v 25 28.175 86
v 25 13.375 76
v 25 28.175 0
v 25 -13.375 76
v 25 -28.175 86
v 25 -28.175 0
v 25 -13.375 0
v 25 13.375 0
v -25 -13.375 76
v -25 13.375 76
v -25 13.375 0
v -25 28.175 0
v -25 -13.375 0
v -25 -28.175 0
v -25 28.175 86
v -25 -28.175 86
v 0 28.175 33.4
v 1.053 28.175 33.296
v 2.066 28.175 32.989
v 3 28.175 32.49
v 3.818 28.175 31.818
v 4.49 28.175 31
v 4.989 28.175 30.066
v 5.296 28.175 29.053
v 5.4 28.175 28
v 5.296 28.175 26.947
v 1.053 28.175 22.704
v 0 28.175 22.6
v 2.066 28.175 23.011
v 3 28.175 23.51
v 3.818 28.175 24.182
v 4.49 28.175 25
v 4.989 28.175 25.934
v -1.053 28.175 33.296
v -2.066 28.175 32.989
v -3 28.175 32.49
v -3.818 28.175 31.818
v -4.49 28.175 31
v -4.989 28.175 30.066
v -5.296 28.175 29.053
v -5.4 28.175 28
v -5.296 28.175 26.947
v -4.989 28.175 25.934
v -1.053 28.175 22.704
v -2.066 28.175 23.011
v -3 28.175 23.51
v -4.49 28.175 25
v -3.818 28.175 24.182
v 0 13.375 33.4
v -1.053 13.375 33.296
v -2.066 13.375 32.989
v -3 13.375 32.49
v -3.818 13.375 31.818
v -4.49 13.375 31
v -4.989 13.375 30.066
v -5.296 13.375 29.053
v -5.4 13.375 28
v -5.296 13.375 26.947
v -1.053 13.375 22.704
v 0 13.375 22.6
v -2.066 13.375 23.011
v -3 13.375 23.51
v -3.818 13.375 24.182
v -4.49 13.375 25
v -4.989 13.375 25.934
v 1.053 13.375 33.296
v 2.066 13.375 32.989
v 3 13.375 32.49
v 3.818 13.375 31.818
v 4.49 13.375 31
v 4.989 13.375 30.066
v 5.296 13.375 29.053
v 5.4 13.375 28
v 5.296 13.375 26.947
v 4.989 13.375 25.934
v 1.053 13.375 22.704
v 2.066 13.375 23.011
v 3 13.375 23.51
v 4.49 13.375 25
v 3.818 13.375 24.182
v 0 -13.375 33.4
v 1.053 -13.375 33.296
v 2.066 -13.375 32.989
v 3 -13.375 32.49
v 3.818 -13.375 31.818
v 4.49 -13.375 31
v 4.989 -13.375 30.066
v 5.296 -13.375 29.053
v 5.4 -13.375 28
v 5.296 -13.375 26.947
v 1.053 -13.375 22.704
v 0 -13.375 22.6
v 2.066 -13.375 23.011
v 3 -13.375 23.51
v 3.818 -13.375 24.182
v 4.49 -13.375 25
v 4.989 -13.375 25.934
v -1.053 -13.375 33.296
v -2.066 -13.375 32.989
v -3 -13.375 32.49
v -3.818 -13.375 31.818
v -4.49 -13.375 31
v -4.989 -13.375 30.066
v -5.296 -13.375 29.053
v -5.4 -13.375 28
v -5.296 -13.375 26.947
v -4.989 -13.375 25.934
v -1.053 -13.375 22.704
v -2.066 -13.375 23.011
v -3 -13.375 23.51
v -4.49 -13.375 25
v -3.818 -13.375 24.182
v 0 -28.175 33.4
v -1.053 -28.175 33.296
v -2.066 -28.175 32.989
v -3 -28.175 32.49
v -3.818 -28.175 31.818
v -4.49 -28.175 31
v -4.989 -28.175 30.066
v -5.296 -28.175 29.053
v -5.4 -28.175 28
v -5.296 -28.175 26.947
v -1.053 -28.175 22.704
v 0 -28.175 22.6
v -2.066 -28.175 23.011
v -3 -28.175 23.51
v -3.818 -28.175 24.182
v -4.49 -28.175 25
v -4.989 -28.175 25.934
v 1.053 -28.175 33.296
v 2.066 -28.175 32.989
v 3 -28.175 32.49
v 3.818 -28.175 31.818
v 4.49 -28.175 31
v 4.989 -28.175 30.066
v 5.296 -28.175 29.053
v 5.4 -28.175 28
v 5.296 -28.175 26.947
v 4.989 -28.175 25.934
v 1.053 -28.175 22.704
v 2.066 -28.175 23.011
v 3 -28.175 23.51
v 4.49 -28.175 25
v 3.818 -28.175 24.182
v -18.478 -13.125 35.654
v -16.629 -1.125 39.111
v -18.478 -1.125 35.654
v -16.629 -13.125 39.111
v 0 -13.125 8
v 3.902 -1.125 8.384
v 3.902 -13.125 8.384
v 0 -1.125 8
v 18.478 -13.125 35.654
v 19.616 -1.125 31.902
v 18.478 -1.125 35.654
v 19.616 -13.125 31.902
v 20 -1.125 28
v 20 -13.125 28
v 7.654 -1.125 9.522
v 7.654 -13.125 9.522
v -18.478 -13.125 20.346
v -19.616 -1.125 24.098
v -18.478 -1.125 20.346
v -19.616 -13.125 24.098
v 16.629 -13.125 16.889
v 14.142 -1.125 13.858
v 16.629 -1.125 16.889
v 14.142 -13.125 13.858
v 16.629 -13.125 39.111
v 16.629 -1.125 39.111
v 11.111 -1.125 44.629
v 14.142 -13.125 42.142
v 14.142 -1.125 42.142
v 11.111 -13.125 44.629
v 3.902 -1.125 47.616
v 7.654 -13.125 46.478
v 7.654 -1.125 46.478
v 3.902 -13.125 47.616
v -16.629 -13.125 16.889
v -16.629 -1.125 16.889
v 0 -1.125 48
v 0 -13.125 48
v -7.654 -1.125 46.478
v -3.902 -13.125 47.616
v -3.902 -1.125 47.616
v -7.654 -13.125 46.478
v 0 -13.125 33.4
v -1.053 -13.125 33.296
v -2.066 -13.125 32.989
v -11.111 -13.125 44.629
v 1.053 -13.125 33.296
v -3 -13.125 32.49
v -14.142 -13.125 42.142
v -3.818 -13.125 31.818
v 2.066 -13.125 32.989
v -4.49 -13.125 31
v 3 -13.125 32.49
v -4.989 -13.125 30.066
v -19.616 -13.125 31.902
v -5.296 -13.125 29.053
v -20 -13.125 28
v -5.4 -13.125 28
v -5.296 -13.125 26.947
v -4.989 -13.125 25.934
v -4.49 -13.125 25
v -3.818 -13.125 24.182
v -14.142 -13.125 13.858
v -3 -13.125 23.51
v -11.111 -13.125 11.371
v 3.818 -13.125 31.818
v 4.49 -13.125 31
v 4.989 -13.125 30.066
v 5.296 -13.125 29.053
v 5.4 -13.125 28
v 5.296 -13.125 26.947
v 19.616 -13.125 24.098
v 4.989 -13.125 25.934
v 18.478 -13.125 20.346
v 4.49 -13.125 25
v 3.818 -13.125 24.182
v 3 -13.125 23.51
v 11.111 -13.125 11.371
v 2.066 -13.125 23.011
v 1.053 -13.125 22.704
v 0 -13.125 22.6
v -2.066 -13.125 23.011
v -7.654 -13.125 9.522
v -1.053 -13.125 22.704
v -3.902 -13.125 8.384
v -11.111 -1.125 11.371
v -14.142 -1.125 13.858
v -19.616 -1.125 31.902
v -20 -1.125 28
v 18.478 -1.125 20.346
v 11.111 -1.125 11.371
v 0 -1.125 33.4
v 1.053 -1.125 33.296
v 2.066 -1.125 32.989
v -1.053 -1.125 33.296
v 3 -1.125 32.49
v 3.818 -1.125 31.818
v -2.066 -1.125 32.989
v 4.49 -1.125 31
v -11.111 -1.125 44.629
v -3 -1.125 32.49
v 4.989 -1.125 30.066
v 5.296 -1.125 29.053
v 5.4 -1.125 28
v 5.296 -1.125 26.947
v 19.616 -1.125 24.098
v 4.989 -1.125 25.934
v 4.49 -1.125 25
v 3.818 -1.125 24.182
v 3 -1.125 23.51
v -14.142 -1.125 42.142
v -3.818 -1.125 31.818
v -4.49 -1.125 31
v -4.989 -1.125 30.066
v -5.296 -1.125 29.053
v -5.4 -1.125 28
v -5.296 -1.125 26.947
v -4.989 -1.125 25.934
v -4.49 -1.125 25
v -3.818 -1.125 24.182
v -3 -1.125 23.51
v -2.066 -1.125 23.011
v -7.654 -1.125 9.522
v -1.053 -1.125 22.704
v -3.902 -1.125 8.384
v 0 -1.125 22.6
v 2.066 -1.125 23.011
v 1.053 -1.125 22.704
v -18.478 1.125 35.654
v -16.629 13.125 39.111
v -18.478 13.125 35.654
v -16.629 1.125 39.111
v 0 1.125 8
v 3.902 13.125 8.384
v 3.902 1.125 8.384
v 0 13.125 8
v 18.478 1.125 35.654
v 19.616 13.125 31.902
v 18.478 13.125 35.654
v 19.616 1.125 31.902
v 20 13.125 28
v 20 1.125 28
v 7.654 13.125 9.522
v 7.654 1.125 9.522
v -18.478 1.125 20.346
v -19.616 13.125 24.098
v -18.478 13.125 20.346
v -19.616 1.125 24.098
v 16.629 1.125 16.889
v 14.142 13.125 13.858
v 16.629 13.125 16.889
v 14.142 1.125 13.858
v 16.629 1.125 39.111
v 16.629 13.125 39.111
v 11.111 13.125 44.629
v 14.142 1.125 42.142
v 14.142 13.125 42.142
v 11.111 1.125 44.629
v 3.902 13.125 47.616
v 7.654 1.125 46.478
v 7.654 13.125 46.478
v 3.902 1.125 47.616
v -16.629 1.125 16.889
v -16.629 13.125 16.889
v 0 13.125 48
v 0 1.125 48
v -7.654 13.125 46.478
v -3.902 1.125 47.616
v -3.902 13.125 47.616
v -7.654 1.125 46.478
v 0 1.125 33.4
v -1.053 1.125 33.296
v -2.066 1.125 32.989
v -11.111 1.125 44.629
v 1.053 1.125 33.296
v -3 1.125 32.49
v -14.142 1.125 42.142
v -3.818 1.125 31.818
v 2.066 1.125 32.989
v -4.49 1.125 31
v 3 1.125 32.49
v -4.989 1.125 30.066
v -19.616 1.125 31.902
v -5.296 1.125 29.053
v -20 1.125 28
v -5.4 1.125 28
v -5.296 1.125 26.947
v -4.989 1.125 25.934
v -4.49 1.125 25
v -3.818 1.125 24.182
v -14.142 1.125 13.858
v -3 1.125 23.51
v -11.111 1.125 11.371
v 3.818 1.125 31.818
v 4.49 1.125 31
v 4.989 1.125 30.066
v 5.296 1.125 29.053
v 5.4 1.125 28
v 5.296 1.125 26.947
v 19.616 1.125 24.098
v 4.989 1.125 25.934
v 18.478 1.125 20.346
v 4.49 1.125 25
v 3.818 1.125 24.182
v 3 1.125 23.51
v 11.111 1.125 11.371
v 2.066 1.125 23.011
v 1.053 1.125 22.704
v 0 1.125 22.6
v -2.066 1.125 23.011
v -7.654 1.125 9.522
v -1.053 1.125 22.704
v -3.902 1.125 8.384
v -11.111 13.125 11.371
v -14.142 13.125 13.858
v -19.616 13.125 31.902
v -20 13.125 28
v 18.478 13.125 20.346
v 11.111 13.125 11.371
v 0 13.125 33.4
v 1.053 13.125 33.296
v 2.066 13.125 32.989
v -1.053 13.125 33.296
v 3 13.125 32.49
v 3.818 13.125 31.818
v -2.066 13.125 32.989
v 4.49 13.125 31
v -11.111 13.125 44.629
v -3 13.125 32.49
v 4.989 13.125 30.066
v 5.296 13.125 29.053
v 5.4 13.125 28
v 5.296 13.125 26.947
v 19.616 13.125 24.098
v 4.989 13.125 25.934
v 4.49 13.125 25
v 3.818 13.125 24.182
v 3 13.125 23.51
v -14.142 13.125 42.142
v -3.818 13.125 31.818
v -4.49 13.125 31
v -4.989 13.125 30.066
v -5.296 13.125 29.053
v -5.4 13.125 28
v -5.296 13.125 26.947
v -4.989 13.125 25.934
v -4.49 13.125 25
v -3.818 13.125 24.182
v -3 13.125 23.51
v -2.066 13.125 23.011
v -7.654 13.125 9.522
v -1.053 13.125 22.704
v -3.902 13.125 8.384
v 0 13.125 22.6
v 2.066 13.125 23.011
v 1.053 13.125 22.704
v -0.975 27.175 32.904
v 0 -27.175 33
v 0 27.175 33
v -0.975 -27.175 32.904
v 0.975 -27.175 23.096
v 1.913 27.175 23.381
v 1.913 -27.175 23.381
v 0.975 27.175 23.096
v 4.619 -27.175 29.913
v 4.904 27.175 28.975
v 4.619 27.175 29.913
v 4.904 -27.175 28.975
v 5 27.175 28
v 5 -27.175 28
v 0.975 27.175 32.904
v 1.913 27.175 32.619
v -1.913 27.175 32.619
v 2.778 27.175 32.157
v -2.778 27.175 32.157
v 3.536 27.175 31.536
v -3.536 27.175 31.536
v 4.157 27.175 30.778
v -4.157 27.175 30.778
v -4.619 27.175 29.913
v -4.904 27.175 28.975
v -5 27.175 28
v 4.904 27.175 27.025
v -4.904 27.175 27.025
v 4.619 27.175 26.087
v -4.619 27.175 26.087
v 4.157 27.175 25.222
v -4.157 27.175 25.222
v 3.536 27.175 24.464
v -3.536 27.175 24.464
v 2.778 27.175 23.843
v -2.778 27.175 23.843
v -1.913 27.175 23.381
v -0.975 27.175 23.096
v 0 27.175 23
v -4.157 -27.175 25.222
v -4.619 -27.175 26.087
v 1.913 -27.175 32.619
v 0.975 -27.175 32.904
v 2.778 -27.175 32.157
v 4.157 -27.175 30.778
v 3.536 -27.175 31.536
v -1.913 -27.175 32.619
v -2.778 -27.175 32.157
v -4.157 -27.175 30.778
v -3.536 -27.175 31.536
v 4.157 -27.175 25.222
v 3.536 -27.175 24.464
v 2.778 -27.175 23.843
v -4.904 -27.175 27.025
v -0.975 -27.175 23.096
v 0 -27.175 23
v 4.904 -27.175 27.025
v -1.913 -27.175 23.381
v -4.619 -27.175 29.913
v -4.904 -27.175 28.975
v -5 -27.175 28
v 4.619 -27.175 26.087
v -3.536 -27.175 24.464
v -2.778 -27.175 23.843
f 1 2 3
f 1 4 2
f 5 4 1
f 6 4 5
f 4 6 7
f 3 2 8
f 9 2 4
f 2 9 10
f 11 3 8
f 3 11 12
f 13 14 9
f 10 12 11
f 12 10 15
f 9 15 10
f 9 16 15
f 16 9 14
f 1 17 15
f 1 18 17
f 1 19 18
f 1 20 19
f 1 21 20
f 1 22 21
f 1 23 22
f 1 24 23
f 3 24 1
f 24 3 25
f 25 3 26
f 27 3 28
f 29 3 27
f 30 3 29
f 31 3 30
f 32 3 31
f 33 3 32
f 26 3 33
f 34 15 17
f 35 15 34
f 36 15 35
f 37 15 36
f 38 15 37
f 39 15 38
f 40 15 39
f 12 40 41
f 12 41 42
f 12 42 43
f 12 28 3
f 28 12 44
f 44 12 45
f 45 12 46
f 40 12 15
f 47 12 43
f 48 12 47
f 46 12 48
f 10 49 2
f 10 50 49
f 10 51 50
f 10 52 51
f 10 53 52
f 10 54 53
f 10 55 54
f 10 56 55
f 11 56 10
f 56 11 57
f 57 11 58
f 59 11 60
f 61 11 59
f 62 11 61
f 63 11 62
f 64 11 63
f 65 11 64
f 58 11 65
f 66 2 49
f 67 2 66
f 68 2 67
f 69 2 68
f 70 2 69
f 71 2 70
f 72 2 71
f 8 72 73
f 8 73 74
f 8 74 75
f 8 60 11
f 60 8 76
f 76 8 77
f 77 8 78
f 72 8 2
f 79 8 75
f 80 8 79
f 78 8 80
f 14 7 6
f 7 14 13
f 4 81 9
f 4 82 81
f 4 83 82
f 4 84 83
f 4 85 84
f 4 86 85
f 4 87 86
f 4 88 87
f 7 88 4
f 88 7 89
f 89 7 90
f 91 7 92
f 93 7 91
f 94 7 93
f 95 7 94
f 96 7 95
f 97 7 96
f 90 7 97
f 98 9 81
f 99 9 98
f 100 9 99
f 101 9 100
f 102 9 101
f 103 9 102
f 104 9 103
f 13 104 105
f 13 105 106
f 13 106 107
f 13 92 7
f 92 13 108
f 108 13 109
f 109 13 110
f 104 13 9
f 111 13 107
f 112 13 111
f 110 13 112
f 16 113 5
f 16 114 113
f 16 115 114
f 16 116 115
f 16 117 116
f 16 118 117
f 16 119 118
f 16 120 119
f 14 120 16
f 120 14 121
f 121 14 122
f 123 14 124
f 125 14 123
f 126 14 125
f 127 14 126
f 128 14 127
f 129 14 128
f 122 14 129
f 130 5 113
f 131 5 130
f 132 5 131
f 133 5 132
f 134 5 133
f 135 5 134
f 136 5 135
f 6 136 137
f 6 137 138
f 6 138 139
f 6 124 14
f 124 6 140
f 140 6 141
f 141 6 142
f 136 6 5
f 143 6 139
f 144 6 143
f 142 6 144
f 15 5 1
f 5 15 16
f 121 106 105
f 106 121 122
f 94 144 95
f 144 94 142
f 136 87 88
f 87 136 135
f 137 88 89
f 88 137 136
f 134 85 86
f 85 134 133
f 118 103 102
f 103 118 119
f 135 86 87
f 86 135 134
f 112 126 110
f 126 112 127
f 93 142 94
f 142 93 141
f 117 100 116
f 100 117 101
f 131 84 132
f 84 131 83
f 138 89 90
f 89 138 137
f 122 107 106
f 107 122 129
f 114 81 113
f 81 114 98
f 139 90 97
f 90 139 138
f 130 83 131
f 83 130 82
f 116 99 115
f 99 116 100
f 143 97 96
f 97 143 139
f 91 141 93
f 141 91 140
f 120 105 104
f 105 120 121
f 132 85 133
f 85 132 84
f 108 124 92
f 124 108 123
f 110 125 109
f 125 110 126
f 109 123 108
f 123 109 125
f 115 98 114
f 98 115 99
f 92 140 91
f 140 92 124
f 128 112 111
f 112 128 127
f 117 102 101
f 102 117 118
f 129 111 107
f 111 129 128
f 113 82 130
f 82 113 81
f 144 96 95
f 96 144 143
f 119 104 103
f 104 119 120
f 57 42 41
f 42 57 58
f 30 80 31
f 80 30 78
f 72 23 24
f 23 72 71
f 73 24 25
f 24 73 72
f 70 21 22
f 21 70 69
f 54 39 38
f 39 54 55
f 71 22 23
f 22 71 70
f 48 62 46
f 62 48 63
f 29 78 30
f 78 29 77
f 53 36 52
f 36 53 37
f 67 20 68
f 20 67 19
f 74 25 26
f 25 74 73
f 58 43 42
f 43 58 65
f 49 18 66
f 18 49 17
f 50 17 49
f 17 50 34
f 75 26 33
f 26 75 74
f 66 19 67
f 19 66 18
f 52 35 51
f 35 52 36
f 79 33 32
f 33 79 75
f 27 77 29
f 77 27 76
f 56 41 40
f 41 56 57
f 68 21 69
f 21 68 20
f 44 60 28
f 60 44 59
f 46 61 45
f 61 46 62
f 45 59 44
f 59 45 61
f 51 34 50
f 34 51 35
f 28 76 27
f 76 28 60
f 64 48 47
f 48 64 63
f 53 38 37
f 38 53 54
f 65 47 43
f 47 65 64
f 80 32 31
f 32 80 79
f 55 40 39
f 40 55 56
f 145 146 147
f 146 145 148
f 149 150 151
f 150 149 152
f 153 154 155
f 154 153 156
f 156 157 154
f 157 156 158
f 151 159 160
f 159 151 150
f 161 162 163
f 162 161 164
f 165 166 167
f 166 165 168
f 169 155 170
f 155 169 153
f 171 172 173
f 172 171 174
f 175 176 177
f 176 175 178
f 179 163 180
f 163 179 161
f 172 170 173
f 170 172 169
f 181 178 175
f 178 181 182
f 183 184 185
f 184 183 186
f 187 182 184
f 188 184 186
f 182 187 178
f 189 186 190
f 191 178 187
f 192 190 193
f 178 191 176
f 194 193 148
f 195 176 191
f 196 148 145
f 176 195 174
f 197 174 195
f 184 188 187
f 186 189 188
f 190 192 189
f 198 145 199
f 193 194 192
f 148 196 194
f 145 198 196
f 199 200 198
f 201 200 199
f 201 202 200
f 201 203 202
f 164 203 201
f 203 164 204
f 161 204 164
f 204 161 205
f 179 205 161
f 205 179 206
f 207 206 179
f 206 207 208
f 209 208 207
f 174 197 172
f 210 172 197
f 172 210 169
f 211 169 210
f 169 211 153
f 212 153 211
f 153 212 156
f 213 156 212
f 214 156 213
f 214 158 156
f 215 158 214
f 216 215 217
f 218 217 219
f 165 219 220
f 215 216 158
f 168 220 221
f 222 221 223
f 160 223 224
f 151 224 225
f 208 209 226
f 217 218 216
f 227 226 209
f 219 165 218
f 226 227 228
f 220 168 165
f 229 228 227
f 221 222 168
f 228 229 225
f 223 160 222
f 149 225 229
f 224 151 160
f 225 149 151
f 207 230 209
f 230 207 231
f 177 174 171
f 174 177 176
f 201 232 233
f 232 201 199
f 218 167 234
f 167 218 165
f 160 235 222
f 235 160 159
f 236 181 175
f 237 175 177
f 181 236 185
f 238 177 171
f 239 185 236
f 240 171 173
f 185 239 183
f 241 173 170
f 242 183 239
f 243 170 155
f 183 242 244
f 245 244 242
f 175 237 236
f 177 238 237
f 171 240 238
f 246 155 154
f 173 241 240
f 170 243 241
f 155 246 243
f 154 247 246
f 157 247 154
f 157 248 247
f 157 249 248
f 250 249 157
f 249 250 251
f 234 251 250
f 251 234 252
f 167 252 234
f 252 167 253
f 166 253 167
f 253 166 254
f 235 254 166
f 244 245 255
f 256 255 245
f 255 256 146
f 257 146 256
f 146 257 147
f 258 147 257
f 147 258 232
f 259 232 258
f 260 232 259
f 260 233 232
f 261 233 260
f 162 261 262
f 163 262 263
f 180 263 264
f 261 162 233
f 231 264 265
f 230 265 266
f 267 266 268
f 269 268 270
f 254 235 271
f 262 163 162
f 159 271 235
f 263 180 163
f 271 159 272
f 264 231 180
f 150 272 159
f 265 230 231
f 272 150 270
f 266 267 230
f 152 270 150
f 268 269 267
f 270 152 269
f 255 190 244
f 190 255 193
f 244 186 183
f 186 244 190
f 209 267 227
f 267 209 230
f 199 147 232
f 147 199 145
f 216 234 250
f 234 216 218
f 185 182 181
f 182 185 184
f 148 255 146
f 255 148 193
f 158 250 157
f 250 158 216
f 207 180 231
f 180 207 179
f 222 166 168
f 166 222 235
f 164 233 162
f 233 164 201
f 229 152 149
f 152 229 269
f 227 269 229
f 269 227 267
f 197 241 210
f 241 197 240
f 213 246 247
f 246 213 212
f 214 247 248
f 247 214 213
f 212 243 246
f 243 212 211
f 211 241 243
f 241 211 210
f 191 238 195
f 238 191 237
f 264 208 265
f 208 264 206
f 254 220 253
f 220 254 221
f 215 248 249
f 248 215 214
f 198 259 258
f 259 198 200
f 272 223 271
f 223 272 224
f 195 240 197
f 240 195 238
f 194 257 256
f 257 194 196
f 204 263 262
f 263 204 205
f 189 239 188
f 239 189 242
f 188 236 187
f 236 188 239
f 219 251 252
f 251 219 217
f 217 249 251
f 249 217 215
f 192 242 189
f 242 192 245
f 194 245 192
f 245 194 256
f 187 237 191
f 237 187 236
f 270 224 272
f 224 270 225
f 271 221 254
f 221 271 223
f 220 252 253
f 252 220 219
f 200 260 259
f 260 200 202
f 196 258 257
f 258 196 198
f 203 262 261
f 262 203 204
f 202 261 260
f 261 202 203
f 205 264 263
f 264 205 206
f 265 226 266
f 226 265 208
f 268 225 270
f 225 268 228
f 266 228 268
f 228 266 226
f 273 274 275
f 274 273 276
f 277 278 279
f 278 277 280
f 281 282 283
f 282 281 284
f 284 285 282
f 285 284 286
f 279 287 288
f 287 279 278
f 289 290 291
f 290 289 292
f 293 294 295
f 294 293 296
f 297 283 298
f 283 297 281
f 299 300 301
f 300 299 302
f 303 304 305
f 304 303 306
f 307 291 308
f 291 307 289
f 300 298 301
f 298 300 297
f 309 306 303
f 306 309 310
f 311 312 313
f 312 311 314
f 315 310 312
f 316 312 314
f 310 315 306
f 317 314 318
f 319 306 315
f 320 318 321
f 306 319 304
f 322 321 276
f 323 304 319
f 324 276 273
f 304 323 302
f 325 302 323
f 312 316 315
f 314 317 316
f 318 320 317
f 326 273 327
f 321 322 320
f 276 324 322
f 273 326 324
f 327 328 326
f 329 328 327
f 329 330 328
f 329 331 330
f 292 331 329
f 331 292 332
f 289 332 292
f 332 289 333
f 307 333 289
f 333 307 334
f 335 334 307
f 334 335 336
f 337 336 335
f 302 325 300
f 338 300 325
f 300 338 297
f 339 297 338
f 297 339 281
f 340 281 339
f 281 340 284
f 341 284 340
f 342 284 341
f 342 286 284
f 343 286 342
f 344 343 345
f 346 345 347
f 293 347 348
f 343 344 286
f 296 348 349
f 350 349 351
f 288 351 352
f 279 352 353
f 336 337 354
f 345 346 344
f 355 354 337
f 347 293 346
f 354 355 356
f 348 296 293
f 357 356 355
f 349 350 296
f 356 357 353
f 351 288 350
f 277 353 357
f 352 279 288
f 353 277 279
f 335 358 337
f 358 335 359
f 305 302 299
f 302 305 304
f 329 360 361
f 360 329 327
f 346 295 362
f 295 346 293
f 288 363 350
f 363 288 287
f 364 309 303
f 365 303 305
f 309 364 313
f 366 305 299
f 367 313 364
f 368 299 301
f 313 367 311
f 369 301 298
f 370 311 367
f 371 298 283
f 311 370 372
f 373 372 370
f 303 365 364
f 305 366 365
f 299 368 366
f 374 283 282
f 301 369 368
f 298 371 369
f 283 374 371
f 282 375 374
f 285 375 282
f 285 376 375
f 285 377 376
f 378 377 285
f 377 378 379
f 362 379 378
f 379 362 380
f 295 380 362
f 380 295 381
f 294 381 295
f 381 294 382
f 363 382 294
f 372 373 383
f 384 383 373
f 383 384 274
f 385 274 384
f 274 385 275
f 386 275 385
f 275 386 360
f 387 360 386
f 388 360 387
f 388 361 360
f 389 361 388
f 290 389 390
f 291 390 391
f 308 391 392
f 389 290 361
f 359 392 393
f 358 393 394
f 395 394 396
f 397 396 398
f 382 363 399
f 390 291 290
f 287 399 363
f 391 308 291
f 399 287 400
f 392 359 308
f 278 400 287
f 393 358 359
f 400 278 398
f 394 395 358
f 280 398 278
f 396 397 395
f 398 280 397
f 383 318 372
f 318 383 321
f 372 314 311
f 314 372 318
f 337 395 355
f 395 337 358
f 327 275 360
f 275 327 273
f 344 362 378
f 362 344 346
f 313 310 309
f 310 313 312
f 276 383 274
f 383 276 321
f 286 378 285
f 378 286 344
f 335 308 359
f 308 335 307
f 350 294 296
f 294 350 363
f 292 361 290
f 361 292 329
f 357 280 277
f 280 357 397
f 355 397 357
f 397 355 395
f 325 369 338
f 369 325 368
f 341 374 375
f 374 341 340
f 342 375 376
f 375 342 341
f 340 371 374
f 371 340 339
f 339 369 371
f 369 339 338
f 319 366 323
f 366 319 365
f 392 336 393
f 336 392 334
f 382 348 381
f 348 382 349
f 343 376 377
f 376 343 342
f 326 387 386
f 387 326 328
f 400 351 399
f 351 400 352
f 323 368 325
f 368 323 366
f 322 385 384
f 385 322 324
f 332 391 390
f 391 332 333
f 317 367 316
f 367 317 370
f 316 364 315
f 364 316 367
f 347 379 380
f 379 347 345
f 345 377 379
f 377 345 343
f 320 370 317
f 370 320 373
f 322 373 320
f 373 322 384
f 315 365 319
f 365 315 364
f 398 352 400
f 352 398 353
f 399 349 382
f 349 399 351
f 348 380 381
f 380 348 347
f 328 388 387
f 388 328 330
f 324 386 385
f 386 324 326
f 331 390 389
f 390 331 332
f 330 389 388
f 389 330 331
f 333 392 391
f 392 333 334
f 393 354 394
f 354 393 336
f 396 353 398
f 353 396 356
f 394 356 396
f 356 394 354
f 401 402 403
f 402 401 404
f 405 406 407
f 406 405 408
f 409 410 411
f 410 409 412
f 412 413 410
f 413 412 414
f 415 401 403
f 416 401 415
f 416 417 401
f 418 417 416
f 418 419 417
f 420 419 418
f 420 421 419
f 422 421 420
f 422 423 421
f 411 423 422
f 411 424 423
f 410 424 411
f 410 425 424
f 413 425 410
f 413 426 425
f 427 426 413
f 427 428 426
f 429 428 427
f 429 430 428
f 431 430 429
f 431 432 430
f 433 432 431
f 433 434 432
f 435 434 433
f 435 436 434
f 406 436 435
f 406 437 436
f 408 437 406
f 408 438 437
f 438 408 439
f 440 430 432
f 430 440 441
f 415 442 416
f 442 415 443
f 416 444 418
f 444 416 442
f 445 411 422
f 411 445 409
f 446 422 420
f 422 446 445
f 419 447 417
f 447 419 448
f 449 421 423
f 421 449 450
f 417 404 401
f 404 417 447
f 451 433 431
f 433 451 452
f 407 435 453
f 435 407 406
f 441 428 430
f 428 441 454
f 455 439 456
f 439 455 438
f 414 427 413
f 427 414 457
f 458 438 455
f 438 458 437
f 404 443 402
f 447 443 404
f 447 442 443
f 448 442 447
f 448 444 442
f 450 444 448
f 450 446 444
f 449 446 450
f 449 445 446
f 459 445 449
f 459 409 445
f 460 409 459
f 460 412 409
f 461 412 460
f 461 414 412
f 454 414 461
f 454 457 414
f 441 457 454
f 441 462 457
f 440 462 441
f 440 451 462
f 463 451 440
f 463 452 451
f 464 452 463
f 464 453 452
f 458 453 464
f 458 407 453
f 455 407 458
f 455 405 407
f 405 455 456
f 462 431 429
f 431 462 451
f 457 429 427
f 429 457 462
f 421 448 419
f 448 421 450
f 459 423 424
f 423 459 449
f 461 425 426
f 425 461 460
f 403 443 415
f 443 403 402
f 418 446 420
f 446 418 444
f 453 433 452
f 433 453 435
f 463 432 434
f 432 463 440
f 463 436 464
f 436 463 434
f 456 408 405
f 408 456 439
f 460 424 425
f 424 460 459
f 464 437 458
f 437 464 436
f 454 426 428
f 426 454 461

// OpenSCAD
$fn = 32;

// ------------------------------------------------------------------------
// Trolley wheel set: wheels d40, fork 76 mm tall
// Every part is its own module, assembly() places every instance.
// ------------------------------------------------------------------------

// --- part 1 ---
module trolley_fork() {
  difference() {
    union() {
      translate([-25, 13.375, 0]) cube([50, 14.8, 76]);
      translate([-25, -28.175, 0]) cube([50, 14.8, 76]);
      translate([-25, -28.175, 76]) cube([50, 56.35, 10]);
    }
    translate([0, -20.775, 28]) rotate([90, 0, 0]) cylinder(h = 16.8, d = 10.8, center = true);
    translate([0, 20.775, 28]) rotate([90, 0, 0]) cylinder(h = 16.8, d = 10.8, center = true);
  }
}

// --- part 2 ---
module trolley_wheel() {
  difference() {
      translate([0, 0, 0]) cylinder(h = 12, d = 40);
      translate([0, 0, -1]) cylinder(h = 14, d = 10.8);
    }
}

// --- part 3 ---
module trolley_axle() {
  translate([0, 0, -27.175]) cylinder(h = 54.35, d = 10);
}

// --- assembly ---
module assembly() {
  color([0.80, 0.24, 0.20]) translate([0, 0, 0]) rotate([0, 0, 0]) trolley_fork();
  color([0.20, 0.45, 0.75]) translate([0, -1.125, 28]) rotate([90, 0, 0]) trolley_wheel();
  color([0.25, 0.62, 0.32]) translate([0, 13.125, 28]) rotate([90, 0, 0]) trolley_wheel();
  color([0.92, 0.70, 0.18]) translate([0, 0, 28]) rotate([90, 0, 0]) trolley_axle();
}

assembly();
